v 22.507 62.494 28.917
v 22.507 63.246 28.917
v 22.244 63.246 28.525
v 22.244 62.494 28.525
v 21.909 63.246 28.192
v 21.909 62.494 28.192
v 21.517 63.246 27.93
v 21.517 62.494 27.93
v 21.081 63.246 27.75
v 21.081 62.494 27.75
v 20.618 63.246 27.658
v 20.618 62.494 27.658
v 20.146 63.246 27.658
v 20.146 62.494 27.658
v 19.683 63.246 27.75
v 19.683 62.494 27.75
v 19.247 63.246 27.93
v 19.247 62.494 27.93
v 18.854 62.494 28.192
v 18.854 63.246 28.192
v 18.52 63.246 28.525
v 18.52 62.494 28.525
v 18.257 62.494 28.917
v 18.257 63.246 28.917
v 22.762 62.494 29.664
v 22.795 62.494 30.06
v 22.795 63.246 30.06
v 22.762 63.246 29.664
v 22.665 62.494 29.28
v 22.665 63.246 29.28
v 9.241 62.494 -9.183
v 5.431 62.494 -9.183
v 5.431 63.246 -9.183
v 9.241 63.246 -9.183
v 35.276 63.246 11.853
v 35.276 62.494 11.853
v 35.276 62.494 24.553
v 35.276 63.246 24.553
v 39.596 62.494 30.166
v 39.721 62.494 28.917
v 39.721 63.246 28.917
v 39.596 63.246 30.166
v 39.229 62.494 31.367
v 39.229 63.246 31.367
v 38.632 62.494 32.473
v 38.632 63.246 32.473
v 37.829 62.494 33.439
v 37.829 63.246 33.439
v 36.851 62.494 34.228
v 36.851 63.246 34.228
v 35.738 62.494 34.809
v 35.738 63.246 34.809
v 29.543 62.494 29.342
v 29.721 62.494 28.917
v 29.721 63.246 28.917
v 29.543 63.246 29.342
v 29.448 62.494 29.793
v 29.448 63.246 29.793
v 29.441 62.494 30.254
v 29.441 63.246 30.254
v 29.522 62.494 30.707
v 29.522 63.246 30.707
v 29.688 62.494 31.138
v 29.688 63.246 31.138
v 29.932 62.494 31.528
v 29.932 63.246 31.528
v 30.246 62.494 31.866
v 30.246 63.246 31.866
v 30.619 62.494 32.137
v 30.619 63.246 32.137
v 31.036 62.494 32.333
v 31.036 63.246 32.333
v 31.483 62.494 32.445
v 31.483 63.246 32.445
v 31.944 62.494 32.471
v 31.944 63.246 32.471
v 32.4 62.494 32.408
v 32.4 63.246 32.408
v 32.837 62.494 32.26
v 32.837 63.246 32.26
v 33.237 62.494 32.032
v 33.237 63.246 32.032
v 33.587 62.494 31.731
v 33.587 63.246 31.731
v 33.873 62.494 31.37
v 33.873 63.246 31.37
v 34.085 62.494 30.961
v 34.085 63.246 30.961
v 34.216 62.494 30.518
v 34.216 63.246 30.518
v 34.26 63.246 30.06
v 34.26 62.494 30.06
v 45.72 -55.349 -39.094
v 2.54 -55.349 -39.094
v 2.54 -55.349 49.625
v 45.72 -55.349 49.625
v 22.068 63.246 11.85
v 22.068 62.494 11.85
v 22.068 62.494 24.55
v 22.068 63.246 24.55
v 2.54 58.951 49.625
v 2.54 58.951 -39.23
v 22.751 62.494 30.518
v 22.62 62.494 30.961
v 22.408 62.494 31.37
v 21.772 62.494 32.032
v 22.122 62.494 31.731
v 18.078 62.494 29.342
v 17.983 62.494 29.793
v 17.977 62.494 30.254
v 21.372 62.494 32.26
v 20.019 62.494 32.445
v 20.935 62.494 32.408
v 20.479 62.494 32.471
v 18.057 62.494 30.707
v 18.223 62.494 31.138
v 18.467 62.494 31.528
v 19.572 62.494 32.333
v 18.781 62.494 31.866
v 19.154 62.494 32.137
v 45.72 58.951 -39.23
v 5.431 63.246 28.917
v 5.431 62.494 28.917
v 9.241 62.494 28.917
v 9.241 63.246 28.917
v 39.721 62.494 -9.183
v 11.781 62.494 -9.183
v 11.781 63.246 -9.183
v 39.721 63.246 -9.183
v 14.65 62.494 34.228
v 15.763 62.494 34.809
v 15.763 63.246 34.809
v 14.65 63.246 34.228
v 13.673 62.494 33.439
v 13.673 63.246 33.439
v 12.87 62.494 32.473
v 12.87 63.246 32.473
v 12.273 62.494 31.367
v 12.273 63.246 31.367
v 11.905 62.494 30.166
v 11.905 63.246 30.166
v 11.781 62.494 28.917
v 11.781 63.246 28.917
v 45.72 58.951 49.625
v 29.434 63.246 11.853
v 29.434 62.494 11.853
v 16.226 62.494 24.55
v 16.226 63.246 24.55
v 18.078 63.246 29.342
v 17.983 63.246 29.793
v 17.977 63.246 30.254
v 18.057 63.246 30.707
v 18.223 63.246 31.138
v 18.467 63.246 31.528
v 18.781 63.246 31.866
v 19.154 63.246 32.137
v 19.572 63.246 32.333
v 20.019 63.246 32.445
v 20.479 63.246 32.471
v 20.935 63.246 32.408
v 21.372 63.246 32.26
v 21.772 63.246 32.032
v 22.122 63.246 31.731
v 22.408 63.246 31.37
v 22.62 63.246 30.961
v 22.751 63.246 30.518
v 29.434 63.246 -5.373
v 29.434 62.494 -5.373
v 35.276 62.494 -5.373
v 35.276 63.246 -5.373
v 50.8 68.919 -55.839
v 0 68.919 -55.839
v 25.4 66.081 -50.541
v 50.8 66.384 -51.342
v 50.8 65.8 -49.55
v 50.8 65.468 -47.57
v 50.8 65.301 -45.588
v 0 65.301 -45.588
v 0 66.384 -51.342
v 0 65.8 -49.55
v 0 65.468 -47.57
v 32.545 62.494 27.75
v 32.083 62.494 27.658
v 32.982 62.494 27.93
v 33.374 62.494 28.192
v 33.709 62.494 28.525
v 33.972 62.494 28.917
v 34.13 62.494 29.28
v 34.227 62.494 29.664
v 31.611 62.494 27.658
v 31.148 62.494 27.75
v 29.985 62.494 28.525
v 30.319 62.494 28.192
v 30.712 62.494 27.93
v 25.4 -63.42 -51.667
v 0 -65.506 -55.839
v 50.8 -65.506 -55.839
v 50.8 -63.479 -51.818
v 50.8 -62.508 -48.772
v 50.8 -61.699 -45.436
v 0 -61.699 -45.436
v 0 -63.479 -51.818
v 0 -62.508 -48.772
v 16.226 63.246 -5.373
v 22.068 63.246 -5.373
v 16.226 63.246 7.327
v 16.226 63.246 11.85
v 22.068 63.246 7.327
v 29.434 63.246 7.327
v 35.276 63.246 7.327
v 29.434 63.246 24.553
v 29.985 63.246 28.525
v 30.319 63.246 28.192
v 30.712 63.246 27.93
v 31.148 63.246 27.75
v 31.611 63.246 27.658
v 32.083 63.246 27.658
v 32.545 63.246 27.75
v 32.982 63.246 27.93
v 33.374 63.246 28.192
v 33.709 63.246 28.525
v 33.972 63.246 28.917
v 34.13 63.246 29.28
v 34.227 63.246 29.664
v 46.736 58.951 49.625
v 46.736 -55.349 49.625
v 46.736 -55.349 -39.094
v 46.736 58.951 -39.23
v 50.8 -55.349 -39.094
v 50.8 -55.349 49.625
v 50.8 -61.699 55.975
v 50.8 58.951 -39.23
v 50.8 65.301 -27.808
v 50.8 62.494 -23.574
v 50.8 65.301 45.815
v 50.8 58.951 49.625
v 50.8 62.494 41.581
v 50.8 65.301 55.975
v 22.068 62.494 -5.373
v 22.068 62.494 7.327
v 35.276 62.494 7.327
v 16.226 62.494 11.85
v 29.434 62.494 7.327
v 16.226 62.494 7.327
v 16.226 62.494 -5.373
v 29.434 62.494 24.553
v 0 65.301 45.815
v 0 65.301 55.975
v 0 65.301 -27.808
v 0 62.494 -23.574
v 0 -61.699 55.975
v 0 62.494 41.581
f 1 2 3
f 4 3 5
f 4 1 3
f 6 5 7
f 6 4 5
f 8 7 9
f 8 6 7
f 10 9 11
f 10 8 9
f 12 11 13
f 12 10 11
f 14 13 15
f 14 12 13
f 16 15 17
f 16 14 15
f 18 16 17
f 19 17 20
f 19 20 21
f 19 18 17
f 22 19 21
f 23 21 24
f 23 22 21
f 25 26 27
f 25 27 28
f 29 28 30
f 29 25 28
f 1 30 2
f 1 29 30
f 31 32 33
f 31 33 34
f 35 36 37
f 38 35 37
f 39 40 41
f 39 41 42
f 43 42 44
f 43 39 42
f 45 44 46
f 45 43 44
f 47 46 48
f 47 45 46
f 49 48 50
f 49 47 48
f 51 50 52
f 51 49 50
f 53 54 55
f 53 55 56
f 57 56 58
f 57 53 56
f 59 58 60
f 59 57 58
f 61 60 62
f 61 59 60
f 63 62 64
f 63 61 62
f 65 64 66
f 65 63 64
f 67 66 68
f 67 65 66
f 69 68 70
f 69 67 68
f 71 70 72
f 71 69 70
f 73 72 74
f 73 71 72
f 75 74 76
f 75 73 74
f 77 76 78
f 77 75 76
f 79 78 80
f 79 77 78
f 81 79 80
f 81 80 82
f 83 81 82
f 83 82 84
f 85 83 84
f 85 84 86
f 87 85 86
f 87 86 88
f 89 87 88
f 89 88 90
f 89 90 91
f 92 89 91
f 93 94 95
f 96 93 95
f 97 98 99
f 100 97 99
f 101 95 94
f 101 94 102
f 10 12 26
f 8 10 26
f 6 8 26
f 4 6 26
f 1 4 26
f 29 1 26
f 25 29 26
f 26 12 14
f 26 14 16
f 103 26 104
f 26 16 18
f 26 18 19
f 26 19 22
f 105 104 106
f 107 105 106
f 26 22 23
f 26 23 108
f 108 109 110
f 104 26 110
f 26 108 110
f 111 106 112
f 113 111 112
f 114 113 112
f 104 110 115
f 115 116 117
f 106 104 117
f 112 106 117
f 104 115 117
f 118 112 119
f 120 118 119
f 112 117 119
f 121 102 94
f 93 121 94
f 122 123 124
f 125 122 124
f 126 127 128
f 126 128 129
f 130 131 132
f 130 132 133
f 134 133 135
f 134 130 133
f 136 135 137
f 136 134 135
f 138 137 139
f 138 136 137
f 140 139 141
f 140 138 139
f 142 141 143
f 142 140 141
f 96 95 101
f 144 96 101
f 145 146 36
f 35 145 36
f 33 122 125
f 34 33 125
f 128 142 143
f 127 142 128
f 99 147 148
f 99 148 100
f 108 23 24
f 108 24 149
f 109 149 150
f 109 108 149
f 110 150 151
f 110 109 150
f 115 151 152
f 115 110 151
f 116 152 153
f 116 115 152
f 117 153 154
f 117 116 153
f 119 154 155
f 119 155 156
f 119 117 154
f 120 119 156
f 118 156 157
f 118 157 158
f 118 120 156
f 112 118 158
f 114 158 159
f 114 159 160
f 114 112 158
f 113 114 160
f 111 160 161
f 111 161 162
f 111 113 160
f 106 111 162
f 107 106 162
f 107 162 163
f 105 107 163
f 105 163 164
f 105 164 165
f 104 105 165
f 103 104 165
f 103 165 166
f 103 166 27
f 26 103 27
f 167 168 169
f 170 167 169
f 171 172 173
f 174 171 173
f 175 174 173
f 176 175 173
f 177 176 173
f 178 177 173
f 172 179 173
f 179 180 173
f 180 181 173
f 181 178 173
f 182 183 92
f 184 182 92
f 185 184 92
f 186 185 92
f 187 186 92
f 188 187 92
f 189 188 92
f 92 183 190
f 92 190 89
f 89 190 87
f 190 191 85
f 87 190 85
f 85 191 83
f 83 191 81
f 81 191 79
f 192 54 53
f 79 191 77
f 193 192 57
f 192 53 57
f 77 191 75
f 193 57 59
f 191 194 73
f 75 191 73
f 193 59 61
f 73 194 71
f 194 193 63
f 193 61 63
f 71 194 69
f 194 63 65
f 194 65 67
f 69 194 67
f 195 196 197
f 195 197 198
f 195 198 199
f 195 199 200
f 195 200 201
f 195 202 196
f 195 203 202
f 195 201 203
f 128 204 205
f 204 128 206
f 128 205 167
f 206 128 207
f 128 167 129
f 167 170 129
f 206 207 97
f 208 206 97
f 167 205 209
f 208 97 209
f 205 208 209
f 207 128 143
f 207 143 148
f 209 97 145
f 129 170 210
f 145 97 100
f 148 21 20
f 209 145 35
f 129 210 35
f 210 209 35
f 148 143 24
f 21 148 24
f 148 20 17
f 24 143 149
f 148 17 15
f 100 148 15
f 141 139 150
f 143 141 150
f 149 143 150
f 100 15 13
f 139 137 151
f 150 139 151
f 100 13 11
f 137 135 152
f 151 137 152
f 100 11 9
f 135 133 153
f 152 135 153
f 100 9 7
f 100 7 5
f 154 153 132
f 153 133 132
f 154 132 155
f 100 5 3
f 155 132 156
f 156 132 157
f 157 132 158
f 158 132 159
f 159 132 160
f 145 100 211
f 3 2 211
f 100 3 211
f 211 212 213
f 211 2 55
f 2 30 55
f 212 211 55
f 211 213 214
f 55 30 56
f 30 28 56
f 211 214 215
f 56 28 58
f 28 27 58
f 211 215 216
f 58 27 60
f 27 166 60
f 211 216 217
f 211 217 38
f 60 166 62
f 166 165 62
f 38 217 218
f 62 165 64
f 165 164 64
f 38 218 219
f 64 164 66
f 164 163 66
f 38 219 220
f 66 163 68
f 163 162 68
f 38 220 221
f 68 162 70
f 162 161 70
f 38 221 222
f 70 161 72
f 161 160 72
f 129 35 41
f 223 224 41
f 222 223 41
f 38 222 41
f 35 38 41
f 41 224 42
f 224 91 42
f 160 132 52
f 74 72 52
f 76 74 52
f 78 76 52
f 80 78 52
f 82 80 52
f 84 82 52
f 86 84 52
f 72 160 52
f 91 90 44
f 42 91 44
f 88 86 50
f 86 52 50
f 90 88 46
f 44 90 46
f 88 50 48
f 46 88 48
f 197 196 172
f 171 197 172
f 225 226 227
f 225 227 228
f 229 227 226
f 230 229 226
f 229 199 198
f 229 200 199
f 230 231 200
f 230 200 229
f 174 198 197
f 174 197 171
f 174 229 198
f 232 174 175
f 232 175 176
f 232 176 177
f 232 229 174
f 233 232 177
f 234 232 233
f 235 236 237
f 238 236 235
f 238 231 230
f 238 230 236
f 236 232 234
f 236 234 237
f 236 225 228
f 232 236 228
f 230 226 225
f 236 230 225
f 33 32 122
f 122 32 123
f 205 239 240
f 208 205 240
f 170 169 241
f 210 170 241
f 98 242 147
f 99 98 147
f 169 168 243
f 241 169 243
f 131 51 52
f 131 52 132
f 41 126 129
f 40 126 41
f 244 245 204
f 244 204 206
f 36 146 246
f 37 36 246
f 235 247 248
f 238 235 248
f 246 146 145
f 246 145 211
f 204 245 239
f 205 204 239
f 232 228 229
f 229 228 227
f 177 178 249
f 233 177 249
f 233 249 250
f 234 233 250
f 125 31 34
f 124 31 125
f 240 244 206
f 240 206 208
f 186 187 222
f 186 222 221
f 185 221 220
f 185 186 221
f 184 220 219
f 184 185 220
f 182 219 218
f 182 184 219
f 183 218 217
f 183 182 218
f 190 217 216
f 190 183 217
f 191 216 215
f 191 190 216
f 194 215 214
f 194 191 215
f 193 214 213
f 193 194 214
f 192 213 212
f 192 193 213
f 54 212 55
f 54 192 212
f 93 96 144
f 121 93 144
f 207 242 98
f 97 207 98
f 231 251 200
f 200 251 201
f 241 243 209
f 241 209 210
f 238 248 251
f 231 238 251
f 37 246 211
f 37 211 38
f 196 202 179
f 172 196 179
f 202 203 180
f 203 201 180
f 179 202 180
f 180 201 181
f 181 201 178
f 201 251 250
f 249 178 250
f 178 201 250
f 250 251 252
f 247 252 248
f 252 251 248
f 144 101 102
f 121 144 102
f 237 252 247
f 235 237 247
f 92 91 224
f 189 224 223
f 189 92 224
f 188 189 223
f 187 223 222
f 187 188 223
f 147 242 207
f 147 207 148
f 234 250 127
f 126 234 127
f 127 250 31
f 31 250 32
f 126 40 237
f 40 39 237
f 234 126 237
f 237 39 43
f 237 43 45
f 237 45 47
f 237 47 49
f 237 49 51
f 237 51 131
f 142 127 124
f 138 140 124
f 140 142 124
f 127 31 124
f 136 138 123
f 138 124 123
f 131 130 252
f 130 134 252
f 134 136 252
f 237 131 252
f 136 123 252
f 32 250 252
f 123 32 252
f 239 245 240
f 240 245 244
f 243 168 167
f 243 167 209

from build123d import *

# Parameters (mm, degrees)
F1_DEPTH = 50.8
F2_DEPTH = 2.54
F5_START = 43.18
F5_DEPTH = 1.016
F6_START = -61.722
F4_W     = 5.842
F4_H     = 12.7
F4_W_2   = 3.81
F4_H_2   = 38.1
F6_DEPTH = 1.524


# Not quite as in the source:
# - a feature of the source that left no trace in its solid (it failed there, or was rolled back) is left out


with BuildPart() as f1:
    # F0 (on Right) → F1 (new body)
    with BuildSketch(Plane.YZ):
        Polygon((-61.698825866, 55.9749106665), (-61.698825866, -45.4361034706), (65.301174134, -45.5878325482), (65.301174134, -27.8078325482), (62.494367, -23.5736580464), (62.494367, 41.5807361647), (65.301174134, 45.8149106665), (65.301174134, 55.9749106665), align=None)
        Polygon((-55.3488239149, -39.093683444), (-55.3488239149, 49.6249087155), (58.951172183, 49.6249087155), (58.951172183, -39.2302396091), align=None, mode=Mode.SUBTRACT)
        with BuildLine():
            Line((65.301174134, -45.5878325482), (-61.698825866, -45.4361034706))
            add(Edge.make_bspline(
                [(-65.5058175325, -55.8386668563), (-64.7629052579, -54.5340589091), (-63.1453130575, -51.6934494428), (-62.2064804259, -47.6321617795), (-61.698825866, -45.4361034706)],
                knots=[0, 0, 0, 0, 0.4592704357, 1, 1, 1, 1], degree=3))
            Line((-65.5058175325, -55.8386668563), (68.9185634255, -55.8386668563))
            add(Edge.make_bspline(
                [(68.9185634255, -55.8386668563), (67.8020531364, -54.0848642317), (65.6584922314, -50.7307193347), (65.4183999928, -47.2370915893), (65.301174134, -45.5878325482)],
                knots=[0, 0, 0, 0, 0.5226245331, 1, 1, 1, 1], degree=3))
        make_face()
    extrude(amount=F1_DEPTH)

    # F0 (on Right) → F2 (join)
    with BuildSketch(Plane.YZ):
        Polygon((58.951172183, 49.6249087155), (-55.3488239149, 49.6249087155), (-55.3488239149, -39.093683444), (58.951172183, -39.2302396091), align=None)
    extrude(amount=F2_DEPTH)

    # F2_face (on face) → F5 (join)
    with BuildSketch(Plane(origin=(2.54, 1.8158237937, 5.2314648434), x_dir=(0, 1, 0), z_dir=(1, 0, 0)).offset(F5_START)):
        Polygon((57.1353483893, -44.4617044525), (57.1353483893, 44.3934438721), (-57.1646477086, 44.3934438721), (-57.1646477086, -44.3251482873), align=None)
    extrude(amount=F5_DEPTH)

    # F4 (on Front) → F6 (join)
    with BuildSketch(Plane.XZ.offset(F6_START)):
        with BuildLine():
            Line((39.7206060588, -9.1834223449), (39.7206060588, 28.9165776551))
            Line((39.7206060588, 28.9165776551), (33.9717225262, 28.9165776551))
            ThreePointArc((33.9717225262, 28.9165776551), (31.8466060588, 27.6465776551), (29.7214895914, 28.9165776551))
            Line((29.7214895914, 28.9165776551), (22.506811127, 28.9165776551))
            ThreePointArc((22.506811127, 28.9165776551), (20.3816946596, 27.6465776551), (18.2565781922, 28.9165776551))
            Line((18.2565781922, 28.9165776551), (11.7806060588, 28.9165776551))
            Line((11.7806060588, 28.9165776551), (11.7806060588, -9.1834223449))
            Line((11.7806060588, -9.1834223449), (39.7206060588, -9.1834223449))
        make_face()
        with Locations((19.1466060588, 0.9765776551)):
            Rectangle(F4_W, F4_H, mode=Mode.SUBTRACT)
        with Locations((32.3546060588, 0.9765776551)):
            Rectangle(F4_W, F4_H, mode=Mode.SUBTRACT)
        with Locations((19.1466060588, 18.1998224765)):
            Rectangle(F4_W, F4_H, mode=Mode.SUBTRACT)
        with Locations((32.3546060588, 18.2028314263)):
            Rectangle(F4_W, F4_H, mode=Mode.SUBTRACT)
        with BuildLine():
            Line((33.9717225262, 28.9165776551), (39.7206060588, 28.9165776551))
            ThreePointArc((39.7206060588, 28.9165776551), (38.6315341138, 32.4725776551), (35.7378860588, 34.8088170767))
            Line((35.7378860588, 34.8088170767), (15.7633260588, 34.8088170767))
            ThreePointArc((15.7633260588, 34.8088170767), (12.8696780038, 32.4725776551), (11.7806060588, 28.9165776551))
            Line((11.7806060588, 28.9165776551), (18.2565781922, 28.9165776551))
            ThreePointArc((18.2565781922, 28.9165776551), (19.7923463058, 32.3995002004), (22.7946946596, 30.0595776551))
            ThreePointArc((22.7946946596, 30.0595776551), (22.7216172049, 29.4702293013), (22.506811127, 28.9165776551))
            Line((22.506811127, 28.9165776551), (29.7214895914, 28.9165776551))
            ThreePointArc((29.7214895914, 28.9165776551), (31.2572577051, 32.3995002004), (34.2596060588, 30.0595776551))
            ThreePointArc((34.2596060588, 30.0595776551), (34.1865286041, 29.4702293013), (33.9717225262, 28.9165776551))
        make_face()
        with Locations((7.3356060588, 9.8665776551)):
            Rectangle(F4_W_2, F4_H_2)
    extrude(amount=-F6_DEPTH)


solid = f1.part
